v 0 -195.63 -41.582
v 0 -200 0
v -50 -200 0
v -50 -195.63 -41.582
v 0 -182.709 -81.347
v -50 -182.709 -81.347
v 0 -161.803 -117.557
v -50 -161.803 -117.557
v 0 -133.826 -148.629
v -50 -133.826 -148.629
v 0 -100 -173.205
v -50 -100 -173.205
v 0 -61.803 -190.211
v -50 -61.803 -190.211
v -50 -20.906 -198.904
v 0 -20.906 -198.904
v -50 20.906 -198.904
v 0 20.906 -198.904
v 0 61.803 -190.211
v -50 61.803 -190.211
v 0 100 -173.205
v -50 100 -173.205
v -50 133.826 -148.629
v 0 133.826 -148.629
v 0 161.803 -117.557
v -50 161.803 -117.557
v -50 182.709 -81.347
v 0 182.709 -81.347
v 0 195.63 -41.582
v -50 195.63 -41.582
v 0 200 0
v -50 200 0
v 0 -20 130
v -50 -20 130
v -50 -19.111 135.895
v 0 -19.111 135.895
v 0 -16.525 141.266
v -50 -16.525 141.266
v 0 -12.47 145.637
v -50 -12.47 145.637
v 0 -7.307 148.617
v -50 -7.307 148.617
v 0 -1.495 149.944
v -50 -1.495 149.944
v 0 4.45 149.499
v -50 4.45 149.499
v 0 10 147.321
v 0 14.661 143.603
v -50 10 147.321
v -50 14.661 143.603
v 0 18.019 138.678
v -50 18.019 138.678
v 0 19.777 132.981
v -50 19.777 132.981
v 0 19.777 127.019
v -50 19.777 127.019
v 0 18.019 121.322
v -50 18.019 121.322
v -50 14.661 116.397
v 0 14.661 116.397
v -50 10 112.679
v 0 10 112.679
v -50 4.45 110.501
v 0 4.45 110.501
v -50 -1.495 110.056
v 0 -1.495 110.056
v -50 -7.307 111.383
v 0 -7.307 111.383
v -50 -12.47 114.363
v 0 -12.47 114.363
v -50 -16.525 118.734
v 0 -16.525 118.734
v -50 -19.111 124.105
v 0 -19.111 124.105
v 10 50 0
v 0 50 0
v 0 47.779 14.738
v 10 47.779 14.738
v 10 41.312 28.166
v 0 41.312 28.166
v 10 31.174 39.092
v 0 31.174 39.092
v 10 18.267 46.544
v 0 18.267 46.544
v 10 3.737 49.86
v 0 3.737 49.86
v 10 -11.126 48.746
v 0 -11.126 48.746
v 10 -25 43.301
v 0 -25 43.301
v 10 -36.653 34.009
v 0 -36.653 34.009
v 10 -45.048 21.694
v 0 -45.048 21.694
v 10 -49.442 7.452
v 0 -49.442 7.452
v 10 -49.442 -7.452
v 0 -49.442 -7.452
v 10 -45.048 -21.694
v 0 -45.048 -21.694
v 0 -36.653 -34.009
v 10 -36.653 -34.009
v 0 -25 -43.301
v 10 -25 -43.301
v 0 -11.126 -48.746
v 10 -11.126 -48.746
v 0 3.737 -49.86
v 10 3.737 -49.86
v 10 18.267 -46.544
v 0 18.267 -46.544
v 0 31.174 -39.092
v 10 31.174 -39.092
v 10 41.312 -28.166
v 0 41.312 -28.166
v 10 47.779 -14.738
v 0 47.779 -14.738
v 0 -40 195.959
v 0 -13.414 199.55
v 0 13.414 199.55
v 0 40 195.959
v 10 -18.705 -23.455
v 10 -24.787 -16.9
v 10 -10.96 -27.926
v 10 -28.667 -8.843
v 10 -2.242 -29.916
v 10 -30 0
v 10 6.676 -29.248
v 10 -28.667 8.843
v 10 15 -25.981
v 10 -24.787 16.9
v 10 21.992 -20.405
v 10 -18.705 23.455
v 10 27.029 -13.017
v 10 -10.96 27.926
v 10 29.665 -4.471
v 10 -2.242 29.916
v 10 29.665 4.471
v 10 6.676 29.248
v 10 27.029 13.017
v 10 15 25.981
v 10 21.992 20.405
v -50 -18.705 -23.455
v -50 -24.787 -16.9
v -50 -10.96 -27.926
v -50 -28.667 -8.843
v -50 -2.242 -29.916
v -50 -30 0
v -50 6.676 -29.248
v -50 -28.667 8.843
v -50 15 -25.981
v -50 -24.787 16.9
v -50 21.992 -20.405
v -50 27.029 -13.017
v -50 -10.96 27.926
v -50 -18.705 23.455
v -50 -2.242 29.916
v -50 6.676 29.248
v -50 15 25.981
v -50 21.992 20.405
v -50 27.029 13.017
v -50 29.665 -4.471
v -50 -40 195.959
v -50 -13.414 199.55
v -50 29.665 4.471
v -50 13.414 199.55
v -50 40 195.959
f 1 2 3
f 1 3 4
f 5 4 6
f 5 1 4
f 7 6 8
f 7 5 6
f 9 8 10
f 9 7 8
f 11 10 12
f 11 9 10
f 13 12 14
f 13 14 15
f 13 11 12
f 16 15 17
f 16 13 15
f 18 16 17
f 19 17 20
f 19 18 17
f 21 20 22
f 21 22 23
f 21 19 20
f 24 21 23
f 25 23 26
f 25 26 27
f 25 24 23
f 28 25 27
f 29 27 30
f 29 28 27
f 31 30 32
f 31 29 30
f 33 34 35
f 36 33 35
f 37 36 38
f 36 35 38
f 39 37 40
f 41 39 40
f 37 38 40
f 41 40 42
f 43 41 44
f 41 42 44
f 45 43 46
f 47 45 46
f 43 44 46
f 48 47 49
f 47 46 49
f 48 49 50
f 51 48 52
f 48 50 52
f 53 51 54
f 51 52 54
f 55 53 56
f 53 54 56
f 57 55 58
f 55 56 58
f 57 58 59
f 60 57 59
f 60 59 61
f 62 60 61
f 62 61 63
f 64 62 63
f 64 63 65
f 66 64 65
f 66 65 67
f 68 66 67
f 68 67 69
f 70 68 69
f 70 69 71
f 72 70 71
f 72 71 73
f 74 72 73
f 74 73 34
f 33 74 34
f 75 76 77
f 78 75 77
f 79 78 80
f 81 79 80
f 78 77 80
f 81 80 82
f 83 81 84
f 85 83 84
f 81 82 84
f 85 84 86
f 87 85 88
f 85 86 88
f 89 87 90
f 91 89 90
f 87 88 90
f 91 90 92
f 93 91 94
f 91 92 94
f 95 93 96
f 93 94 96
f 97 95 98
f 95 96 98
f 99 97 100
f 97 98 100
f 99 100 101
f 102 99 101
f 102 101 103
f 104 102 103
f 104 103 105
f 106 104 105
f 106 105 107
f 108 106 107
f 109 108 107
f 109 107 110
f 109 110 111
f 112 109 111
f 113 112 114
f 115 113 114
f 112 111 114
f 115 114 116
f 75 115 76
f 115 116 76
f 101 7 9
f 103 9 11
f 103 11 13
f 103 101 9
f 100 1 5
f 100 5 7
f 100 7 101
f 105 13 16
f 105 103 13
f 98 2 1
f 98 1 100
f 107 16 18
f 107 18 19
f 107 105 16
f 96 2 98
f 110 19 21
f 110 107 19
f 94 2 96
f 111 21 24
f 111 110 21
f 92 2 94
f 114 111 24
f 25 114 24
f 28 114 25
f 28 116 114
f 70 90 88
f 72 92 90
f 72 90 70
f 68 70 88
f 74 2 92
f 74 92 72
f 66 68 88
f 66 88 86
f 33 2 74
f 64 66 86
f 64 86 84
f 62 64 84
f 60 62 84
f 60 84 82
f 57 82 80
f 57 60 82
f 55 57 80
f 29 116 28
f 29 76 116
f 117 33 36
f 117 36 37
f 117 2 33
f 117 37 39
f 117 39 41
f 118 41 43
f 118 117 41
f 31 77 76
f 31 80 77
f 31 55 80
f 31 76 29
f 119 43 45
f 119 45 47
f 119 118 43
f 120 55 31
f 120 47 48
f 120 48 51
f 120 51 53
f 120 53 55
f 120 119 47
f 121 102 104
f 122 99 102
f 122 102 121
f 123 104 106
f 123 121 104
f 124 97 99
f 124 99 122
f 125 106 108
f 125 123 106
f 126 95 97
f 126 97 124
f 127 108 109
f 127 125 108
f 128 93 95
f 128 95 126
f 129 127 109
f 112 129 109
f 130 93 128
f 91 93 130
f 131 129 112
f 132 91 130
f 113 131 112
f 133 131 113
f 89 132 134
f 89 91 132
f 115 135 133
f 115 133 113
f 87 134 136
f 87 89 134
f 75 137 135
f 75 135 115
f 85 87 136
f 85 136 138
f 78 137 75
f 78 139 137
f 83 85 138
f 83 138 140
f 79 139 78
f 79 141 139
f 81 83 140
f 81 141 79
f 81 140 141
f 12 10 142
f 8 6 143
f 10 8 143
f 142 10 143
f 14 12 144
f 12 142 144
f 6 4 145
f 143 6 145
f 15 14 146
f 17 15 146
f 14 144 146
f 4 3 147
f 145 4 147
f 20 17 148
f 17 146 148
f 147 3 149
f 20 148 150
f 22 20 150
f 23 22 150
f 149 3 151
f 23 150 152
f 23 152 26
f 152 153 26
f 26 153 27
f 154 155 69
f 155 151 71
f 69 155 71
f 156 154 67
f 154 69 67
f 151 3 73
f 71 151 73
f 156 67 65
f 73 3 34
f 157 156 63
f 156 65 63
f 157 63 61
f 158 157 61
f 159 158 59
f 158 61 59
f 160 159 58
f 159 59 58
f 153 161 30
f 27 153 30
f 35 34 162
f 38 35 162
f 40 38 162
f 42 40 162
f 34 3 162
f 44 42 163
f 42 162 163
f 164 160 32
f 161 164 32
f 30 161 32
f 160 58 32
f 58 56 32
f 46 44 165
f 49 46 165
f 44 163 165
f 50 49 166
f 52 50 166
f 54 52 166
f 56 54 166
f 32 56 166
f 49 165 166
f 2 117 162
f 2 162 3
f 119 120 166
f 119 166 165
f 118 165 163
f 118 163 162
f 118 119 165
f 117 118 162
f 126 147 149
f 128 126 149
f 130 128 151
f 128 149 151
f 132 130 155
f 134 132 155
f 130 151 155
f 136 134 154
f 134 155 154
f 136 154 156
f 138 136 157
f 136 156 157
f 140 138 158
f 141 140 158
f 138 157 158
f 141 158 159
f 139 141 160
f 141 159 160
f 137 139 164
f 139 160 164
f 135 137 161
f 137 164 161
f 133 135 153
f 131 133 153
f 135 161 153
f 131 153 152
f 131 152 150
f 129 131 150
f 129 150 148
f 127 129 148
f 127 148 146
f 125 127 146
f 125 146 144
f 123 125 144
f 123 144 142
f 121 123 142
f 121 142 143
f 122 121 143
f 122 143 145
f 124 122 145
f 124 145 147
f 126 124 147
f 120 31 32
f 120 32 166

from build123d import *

# Parameters (mm, degrees)
F0_R     = 50
F1_DEPTH = 50
F2_DEPTH = 10
F4_D     = 60
F5_D     = 40


with BuildPart() as f1:
    # F0 (on Right) → F1 (new body)
    with BuildSketch(Plane.YZ):
        with BuildLine():
            Line((-40, 195.959179), (-200, 0))
            ThreePointArc((-200, 0), (0, -200), (200, 0))
            Line((200, 0), (40, 195.959179))
            ThreePointArc((40, 195.959179), (0, 200), (-40, 195.959179))
        make_face()
        Circle(F0_R, mode=Mode.SUBTRACT)
        Circle(F0_R)
    extrude(amount=-F1_DEPTH)

    # F0 (on Right) → F2 (join)
    with BuildSketch(Plane.YZ):
        Circle(F0_R)
    extrude(amount=F2_DEPTH)

    # F4 (through all)
    with Locations(Plane.YZ.offset(10)):
        with Locations((0, 0)):
            Hole(F4_D / 2)

    # F5 (through all)
    with Locations(Plane.YZ):
        with Locations((0, 130)):
            Hole(F5_D / 2)


solid = f1.part
